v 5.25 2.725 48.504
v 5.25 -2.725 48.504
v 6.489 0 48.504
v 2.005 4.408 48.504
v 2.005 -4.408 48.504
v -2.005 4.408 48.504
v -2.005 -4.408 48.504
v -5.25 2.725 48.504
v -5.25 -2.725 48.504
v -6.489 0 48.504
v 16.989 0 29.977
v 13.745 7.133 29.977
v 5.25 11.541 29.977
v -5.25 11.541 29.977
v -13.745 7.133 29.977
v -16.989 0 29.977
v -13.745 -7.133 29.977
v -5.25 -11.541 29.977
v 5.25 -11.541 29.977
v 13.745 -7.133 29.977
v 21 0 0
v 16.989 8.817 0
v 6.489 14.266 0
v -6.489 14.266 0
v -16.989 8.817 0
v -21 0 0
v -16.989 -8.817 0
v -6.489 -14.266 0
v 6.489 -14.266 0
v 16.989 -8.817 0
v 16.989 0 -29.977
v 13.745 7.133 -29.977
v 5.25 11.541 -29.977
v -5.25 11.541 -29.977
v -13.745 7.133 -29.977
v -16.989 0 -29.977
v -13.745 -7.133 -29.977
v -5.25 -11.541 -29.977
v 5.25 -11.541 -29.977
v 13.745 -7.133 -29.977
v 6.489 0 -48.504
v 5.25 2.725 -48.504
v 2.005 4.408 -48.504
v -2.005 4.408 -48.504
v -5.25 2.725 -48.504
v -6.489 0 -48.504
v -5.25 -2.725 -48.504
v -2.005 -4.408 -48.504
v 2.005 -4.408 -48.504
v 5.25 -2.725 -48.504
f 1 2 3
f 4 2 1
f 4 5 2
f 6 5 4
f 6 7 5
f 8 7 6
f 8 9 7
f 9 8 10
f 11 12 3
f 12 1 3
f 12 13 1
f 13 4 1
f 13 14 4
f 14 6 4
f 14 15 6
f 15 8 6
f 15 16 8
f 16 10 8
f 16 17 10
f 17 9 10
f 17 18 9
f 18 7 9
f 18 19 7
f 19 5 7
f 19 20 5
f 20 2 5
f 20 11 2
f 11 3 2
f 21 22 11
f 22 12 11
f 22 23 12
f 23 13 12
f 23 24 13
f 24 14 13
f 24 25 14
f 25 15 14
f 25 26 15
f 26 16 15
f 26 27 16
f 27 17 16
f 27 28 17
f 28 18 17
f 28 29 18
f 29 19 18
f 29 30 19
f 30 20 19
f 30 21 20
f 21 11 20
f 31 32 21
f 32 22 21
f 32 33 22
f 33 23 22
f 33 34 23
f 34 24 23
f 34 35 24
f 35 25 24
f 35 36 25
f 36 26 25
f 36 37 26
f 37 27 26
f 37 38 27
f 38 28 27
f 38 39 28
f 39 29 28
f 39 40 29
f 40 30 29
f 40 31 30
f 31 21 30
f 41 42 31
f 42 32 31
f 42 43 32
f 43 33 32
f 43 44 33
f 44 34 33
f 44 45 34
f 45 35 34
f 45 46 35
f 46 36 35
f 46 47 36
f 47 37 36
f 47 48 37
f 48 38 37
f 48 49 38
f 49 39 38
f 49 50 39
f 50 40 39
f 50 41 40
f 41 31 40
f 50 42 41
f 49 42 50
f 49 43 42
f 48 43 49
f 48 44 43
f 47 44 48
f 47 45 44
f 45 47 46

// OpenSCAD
// Generated by SolidPython 1.0.1 on 2020-07-29 00:46:47


scale(v = [7, 5, 17]) {
	sphere(r = 3);
}
/***********************************************
*********      SolidPython code:      **********
************************************************
 
# import packages: SolidPython
from solid import *
from solid.utils import *
from itertools import chain, combinations, permutations


class Resize:

    def __init__(self, scad_file):
        self.scad_file = scad_file
        #self.scad_file = import_scad(scad_file)
        # cone/cylinder param:
        self.r1 = 0
        self.r2 = 0
        self.h = 0
        # rectangular prism param:
        self.w = 0
        self.l = 0
        # ellipse param:
        self.r = 0

    # import OpenScad code (file name corresponds to shape)


    # classify shape + parameters
    def assign(self, param1, param2, param3):
        if self.scad_file == 'cone.scad':
            self.r1 = param1
            self.r2 = param2
            self.h = param3
        elif self.scad_file == 'cylinder.scad':
            self.r1 = param1
            self.r2 = param2
            self.h = param3
        elif self.scad_file == 'rectangularPrism.scad':
            self.h = param1
            self.l = param2
            self.w = param3
        else:
            self.r = param1
            self.h = param2

    # resize parameters
    def iterate(self):
        x = range(3, 20, 2)
        i = 1
        if self.scad_file == 'cone.scad':
            tempList = list(permutations(x, 2))
            for temp in tempList:
                param1 = temp[0]
                param2 = temp[1]
                filepath = 'produced_scad_files/' + 'cone' + str(param1) + '_' + str(param2) + '_' + '.scad'
                scad_render_to_file(cylinder(h=param1, r1=param2, r2=0), filepath)

        elif self.scad_file == 'cylinder.scad':
            tempList = list(permutations(x, 3))
            for temp in tempList:
                param1 = temp[0]
                param2 = temp[1]
                filepath = 'produced_scad_files/' + 'cylinder' + str(param1) + '_' + str(param2) + '_' + '.scad'
                scad_render_to_file(cylinder(h=param1, r1=param2, r2=param2), filepath)

        elif self.scad_file == 'rectangularPrism.scad':
            tempList = list(permutations(x, 3))
            for temp in tempList:
                param1 = temp[0]
                param2 = temp[1]
                param3 = temp[2]
                filepath = 'produced_scad_files/' + 'rectangularPrism' + str(param1) + '_' + str(param2) + '_' + str(
                    param3) + '.scad'
                scad_render_to_file(cube(size=(param1, param2, param3)), filepath)

        elif self.scad_file == 'ellipse.scad':
            tempList = list(permutations(x, 4))
            for temp in tempList:
                param1 = temp[0]
                param2 = temp[1]
                param3 = temp[2]
                param4 = temp[3]
                filepath = 'produced_scad_files/' + 'ellipse' + str(param1) + '_' + str(param2) + '_' + str(param3) + '_' + str(param4) + '.scad'
                scad_render_to_file(scale([param1, param2, param3])(sphere(r=param4)), filepath)

    def render_to_scadfile(self):
        scad_render_to_file(scad, 'example.scad') 
 
************************************************/
